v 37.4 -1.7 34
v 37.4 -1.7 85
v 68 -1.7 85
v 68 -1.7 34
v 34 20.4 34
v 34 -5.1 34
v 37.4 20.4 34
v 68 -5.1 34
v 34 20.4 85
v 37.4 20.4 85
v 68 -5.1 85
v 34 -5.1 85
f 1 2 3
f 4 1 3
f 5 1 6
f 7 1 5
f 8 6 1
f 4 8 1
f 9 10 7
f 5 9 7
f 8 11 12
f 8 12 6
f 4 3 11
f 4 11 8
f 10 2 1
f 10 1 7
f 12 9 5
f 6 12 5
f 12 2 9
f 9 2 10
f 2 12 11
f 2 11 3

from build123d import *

# Parameters (mm, degrees)
SKETCH_1_W          = 30
SKETCH_1_H          = 15
EXTRUDE_1_DEPTH     = 20
SKETCH_2_W          = 18
SKETCH_2_H          = 13
CUT_EXTRUDE_1_DEPTH = 52.419840529
SCALE_1_SCALE       = 1.7


with BuildPart() as part:
    # 草图1 → 凸台-拉伸1 (new body)
    with BuildSketch(Plane(origin=(40, 0, 0), x_dir=(0, 0, -1), z_dir=(1, 0, 0))):
        with Locations((-35, 4.5)):
            Rectangle(SKETCH_1_W, SKETCH_1_H)
    extrude(amount=-EXTRUDE_1_DEPTH)

    # 草图2 → 切除-拉伸1 (cut, through all)
    with BuildSketch(Plane.XY.offset(50)):
        with Locations((31, 5.5)):
            Rectangle(SKETCH_2_W, SKETCH_2_H)
    extrude(amount=-CUT_EXTRUDE_1_DEPTH, mode=Mode.SUBTRACT)


with BuildPart() as part_1:
    # 缩放比例1: scaled about (0, 0, 0)
    add(part.part.scale(SCALE_1_SCALE))


solid = part_1.part
